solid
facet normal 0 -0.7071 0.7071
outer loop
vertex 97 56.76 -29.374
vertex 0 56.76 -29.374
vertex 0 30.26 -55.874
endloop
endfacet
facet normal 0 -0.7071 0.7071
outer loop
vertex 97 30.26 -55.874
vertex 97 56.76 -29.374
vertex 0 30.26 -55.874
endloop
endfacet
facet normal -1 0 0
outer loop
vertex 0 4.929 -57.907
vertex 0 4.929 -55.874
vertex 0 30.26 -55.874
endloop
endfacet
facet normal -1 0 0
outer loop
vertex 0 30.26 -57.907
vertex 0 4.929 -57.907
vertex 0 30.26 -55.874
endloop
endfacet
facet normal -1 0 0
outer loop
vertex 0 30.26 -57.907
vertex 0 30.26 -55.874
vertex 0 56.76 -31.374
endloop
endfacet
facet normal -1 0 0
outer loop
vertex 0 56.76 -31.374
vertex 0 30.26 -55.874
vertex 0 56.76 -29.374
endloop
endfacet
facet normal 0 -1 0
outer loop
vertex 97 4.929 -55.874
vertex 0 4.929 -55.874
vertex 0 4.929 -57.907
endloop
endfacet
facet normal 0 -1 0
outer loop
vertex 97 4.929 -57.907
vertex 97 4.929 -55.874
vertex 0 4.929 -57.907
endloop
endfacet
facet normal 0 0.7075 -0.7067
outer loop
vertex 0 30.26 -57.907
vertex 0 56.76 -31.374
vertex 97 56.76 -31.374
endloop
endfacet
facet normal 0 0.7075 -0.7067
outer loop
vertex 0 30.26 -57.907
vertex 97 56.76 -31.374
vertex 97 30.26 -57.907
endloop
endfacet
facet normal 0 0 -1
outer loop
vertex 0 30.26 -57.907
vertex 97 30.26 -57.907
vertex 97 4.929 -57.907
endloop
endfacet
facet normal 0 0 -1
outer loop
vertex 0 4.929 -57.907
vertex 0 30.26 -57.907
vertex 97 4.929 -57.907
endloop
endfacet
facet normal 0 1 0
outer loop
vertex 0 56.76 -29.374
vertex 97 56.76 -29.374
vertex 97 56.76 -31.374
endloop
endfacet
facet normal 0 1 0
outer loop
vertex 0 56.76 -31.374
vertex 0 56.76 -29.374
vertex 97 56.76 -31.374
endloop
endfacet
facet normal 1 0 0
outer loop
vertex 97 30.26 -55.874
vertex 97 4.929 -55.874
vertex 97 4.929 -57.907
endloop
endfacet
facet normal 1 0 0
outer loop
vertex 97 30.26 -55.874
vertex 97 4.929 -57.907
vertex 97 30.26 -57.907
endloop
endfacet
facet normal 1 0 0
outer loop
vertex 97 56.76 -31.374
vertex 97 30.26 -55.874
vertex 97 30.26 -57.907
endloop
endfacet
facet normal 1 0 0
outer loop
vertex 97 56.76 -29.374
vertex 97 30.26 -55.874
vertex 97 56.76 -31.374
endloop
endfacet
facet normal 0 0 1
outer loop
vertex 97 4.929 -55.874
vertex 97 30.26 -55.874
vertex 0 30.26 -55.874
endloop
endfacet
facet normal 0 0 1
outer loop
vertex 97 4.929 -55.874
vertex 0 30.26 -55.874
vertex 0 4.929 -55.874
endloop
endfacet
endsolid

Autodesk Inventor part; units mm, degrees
ref_plane "YZ Plane" through (0, 0, 0) normal (1, 0, 0) x (0, 1, 0)
ref_plane "XZ Plane" through (0, 0, 0) normal (0, 1, 0) x (-1, 0, 0)
ref_plane "XY Plane" through (0, 0, 0) normal (0, 0, 1) x (1, 0, 0)
sketch "Esboço1" plane through (0, 0, 0) normal (1, 0, 0) x (0, 1, 0)
  line L0 (30.2603, -55.8743) -> (4.9294, -55.8743)
  line L1 (30.2603, -57.9073) -> (4.9294, -57.9073)
  line L2 (56.7603, -29.3743) -> (30.2603, -55.8743)
  line L3 (56.7603, -31.3743) -> (30.2603, -57.9073)
  line L4 (4.9294, -55.8743) -> (4.9294, -57.9073)
  line L5 (56.7603, -29.3743) -> (56.7603, -31.3743)
  point P0 (0, 0)
  point P1 (56.7603, -55.8743)
  point P2 (56.7603, -55.8743)
  dimension "d4" = 26.5
  dimension "d5" = 26.5
  dimension "d6" = 2
  dimension "d7" = 37.5
extrude "Extrusão1" add sketch "Esboço1" along normal blind 97
equation "\"d5\" = d4"
properties part number "Mini Sumô Definitivo - TAMPA"
